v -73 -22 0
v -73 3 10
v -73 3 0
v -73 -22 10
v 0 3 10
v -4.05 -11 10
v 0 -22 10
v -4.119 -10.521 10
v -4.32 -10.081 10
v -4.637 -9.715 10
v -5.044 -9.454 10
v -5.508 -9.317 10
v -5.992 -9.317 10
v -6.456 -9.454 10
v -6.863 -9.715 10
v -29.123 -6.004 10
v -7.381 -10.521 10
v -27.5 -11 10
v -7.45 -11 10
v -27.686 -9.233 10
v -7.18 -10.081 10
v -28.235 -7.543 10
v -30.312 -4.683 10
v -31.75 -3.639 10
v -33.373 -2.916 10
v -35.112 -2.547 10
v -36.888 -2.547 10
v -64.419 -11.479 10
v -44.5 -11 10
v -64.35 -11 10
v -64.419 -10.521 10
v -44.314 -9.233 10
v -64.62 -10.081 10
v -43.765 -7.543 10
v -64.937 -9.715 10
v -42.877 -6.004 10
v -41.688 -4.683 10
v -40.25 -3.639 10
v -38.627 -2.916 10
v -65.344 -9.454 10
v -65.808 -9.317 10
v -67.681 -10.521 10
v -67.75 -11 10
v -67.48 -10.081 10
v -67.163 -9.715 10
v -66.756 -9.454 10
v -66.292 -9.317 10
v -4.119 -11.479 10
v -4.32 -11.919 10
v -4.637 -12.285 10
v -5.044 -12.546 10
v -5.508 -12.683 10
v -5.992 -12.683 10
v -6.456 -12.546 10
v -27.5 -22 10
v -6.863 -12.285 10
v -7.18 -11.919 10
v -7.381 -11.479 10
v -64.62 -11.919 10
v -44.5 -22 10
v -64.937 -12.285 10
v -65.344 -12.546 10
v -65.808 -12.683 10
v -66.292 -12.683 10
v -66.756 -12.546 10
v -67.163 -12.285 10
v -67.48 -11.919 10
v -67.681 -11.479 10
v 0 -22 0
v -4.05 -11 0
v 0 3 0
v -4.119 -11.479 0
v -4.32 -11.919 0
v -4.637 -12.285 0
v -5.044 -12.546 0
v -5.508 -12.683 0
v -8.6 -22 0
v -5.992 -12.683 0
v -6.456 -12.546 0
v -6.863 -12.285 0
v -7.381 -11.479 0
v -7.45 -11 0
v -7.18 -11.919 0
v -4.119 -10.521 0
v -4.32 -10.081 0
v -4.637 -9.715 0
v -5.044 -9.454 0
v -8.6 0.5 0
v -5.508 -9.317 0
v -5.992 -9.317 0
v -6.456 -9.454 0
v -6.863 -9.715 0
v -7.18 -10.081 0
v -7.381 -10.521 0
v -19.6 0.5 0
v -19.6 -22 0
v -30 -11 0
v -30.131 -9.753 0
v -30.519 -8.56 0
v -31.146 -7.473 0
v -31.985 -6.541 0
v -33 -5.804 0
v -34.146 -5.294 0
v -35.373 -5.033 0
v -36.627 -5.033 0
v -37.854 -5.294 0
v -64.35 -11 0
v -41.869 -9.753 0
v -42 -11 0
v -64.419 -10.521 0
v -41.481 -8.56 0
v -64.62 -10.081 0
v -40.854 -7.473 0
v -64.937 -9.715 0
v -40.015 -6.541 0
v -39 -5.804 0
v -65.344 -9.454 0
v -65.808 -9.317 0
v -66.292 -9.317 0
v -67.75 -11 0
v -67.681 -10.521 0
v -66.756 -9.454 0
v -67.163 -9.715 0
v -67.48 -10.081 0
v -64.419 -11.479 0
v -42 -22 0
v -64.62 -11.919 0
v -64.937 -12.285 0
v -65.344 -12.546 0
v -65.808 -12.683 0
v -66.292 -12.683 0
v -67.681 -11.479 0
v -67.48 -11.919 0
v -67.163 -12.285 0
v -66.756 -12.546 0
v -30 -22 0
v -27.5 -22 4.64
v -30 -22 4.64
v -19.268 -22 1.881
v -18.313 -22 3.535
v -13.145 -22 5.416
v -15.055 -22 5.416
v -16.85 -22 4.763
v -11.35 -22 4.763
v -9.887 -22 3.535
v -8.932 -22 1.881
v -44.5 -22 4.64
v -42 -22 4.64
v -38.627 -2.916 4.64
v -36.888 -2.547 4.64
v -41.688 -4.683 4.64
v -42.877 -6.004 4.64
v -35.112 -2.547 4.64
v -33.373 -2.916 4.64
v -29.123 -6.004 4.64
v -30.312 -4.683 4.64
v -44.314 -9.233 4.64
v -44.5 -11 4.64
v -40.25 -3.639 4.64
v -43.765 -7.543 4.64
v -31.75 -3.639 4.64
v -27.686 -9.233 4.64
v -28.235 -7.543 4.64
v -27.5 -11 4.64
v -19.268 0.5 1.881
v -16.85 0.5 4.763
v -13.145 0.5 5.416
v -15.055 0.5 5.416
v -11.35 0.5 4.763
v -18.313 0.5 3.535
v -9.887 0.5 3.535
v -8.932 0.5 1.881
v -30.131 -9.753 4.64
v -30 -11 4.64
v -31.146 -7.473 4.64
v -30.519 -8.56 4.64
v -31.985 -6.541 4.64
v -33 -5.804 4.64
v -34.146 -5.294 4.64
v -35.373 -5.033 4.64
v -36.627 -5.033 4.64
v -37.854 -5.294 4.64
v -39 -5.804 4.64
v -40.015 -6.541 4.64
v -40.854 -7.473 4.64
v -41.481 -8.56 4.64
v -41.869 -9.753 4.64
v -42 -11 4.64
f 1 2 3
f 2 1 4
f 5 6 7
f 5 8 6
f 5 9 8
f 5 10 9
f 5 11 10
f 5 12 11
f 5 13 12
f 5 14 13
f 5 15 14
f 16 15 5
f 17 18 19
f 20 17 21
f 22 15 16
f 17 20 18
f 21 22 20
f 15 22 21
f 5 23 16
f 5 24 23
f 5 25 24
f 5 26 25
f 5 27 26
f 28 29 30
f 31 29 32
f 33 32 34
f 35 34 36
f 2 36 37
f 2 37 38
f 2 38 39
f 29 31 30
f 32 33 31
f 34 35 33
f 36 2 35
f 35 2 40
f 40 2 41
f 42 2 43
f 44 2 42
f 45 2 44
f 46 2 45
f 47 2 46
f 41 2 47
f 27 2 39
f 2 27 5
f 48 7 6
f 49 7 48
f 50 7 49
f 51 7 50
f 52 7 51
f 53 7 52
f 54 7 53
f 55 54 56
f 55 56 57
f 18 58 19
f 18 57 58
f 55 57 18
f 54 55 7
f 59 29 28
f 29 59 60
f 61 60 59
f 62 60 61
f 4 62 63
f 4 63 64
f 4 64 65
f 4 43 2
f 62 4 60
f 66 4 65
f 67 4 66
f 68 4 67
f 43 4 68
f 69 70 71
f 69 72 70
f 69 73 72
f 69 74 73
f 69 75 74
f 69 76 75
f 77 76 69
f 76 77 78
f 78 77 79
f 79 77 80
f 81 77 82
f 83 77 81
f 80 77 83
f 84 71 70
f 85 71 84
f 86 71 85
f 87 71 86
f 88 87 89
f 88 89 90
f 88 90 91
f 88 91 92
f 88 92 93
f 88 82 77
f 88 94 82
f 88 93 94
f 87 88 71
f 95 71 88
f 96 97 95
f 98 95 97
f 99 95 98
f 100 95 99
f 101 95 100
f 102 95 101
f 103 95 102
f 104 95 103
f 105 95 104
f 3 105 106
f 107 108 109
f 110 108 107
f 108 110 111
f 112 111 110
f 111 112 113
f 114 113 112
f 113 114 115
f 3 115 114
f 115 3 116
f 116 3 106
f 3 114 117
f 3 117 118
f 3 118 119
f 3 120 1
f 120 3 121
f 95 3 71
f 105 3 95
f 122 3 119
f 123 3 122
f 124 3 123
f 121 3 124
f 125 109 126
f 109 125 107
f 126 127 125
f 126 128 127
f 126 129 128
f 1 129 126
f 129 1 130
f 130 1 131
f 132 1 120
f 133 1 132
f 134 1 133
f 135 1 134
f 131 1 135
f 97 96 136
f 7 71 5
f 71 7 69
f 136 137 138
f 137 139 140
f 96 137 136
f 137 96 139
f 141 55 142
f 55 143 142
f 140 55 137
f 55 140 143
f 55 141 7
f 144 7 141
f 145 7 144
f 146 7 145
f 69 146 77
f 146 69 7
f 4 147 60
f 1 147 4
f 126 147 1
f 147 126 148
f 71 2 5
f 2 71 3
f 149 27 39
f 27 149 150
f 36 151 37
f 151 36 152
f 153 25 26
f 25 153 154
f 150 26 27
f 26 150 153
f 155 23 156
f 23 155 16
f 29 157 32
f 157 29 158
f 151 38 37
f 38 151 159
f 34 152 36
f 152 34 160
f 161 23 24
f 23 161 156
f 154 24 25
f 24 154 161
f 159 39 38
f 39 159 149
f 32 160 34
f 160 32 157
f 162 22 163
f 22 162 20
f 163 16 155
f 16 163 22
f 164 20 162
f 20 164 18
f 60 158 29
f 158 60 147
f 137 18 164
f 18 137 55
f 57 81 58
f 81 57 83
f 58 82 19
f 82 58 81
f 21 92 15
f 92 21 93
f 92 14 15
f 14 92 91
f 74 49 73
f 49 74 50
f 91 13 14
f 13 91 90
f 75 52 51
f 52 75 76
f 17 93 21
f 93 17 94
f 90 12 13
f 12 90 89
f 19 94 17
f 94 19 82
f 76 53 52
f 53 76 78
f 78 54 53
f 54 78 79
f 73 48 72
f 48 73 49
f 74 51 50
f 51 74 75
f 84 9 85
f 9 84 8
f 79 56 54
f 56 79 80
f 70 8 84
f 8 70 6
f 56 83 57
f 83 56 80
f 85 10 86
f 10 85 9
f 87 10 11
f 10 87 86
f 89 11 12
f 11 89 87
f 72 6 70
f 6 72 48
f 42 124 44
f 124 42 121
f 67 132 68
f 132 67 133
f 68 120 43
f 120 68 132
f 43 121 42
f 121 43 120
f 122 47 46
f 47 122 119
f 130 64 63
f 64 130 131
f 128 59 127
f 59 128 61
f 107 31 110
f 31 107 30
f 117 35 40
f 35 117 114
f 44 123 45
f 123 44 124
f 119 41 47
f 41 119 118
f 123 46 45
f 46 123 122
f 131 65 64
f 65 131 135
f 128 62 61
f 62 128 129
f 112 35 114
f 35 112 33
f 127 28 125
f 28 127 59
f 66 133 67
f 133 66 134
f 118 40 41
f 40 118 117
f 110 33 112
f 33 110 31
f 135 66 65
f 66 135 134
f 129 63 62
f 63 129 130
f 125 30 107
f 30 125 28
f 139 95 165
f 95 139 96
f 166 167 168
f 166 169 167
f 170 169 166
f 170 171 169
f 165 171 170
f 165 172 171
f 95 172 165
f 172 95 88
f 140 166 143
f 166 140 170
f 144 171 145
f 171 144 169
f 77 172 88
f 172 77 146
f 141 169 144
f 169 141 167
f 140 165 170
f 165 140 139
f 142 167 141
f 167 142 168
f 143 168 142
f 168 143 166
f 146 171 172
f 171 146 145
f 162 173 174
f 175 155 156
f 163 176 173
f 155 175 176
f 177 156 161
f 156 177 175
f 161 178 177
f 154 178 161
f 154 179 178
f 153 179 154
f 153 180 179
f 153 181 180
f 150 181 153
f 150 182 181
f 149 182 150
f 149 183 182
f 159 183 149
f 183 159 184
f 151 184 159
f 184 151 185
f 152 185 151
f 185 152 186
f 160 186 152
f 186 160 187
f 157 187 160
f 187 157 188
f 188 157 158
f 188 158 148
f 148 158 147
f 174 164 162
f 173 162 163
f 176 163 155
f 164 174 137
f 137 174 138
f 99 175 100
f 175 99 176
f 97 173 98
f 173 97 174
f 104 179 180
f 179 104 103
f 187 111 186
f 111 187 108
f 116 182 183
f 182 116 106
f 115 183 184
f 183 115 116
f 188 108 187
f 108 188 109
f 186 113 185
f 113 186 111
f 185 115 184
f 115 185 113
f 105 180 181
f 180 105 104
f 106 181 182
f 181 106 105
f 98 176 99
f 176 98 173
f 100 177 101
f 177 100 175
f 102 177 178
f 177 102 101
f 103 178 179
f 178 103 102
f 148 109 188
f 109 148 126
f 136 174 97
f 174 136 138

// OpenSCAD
/* Remaking of ExtruderNMisc-HuxleyTipClamp.stl
 *  TechZone Huxley hot end clamp part.
 * Totally libre, do whatever you want with that stuff
 *  as long you keep that header here and gimme credit.
 * -- 
 *     DeuxVis - device@ymail.com 
 *
 * Modified by Ketil Froyn for J-Head groove mount - 2012-10-21
 * Several positions were modified to align elements more closely to the 
 * original part from TechZone, by measuring and aligning in Blender.
*/

// added arbitrary rotation to improve display on thingiverse
rotate( [0, 0, 180] ) union() {
 difference() {
  // Base shape
  //cube( size = [73, 22, 10], center = false );
  // 3mm wider bridge to give it more strength when squeezing in a hotend
  translate( [0, -3, 0] ) cube( size = [73, 25, 10], center = false );

  // Thermal barrier hole
//  translate( [36.5, 11, 0] ) { cylinder( h = 10.2, r=8.5, $fs=.5 ); }
  translate( [36, 11, 0] ) { cylinder( h = 10.2, r=8.5, $fs=.5 ); }

  // Cut out side section of thermal barrier hole for groove mount
//   translate ([28, 11, -0.5]) cube (size = [17, 11, 11], center = false );
   translate ([27.5, 11, -0.5]) cube (size = [17, 11, 11], center = false );

  // 2 x M3 screws holes (bowden clamp and xcarriage assembly)
  translate( [5.75, 11, 0] ) cylinder( h = 10.1, r=1.7, $fs=.5 );
//  translate( [66.025, 11, 0] ) cylinder( h = 10.1, r=1.7, $fs=.5 );
  translate( [66.05, 11, 0] ) cylinder( h = 10.1, r=1.7, $fs=.5 );

  // translation found by comparing with original in openscad
  translate( [14.1, 22.5, 0] ) rotate( [90, 0, 0] ) cylinder(h = 23, r=5.5);

 }
 difference() {
  // base shape for groove mount inner edge
//  translate ([27.5, 0, 0]) cube( size = [18, 22, 4.64], center = false );
  translate ([27, 0, 0]) cube( size = [18, 22, 4.64], center = false );

  // hole for inner diameter of groove mount
//  translate( [36.5, 11, 0] ) cylinder( h = 10.2, r=6, $fs =.5);
  translate( [36, 11, 0] ) cylinder( h = 10.2, r=6, $fs =.5);

  // cut out side section of inner edge
//  translate( [30.5, 11, -0.5] ) cube ( size = [12, 11, 11], center = false );
  translate( [30, 11, -0.5] ) cube ( size = [12, 11, 11], center = false );
 }
}
